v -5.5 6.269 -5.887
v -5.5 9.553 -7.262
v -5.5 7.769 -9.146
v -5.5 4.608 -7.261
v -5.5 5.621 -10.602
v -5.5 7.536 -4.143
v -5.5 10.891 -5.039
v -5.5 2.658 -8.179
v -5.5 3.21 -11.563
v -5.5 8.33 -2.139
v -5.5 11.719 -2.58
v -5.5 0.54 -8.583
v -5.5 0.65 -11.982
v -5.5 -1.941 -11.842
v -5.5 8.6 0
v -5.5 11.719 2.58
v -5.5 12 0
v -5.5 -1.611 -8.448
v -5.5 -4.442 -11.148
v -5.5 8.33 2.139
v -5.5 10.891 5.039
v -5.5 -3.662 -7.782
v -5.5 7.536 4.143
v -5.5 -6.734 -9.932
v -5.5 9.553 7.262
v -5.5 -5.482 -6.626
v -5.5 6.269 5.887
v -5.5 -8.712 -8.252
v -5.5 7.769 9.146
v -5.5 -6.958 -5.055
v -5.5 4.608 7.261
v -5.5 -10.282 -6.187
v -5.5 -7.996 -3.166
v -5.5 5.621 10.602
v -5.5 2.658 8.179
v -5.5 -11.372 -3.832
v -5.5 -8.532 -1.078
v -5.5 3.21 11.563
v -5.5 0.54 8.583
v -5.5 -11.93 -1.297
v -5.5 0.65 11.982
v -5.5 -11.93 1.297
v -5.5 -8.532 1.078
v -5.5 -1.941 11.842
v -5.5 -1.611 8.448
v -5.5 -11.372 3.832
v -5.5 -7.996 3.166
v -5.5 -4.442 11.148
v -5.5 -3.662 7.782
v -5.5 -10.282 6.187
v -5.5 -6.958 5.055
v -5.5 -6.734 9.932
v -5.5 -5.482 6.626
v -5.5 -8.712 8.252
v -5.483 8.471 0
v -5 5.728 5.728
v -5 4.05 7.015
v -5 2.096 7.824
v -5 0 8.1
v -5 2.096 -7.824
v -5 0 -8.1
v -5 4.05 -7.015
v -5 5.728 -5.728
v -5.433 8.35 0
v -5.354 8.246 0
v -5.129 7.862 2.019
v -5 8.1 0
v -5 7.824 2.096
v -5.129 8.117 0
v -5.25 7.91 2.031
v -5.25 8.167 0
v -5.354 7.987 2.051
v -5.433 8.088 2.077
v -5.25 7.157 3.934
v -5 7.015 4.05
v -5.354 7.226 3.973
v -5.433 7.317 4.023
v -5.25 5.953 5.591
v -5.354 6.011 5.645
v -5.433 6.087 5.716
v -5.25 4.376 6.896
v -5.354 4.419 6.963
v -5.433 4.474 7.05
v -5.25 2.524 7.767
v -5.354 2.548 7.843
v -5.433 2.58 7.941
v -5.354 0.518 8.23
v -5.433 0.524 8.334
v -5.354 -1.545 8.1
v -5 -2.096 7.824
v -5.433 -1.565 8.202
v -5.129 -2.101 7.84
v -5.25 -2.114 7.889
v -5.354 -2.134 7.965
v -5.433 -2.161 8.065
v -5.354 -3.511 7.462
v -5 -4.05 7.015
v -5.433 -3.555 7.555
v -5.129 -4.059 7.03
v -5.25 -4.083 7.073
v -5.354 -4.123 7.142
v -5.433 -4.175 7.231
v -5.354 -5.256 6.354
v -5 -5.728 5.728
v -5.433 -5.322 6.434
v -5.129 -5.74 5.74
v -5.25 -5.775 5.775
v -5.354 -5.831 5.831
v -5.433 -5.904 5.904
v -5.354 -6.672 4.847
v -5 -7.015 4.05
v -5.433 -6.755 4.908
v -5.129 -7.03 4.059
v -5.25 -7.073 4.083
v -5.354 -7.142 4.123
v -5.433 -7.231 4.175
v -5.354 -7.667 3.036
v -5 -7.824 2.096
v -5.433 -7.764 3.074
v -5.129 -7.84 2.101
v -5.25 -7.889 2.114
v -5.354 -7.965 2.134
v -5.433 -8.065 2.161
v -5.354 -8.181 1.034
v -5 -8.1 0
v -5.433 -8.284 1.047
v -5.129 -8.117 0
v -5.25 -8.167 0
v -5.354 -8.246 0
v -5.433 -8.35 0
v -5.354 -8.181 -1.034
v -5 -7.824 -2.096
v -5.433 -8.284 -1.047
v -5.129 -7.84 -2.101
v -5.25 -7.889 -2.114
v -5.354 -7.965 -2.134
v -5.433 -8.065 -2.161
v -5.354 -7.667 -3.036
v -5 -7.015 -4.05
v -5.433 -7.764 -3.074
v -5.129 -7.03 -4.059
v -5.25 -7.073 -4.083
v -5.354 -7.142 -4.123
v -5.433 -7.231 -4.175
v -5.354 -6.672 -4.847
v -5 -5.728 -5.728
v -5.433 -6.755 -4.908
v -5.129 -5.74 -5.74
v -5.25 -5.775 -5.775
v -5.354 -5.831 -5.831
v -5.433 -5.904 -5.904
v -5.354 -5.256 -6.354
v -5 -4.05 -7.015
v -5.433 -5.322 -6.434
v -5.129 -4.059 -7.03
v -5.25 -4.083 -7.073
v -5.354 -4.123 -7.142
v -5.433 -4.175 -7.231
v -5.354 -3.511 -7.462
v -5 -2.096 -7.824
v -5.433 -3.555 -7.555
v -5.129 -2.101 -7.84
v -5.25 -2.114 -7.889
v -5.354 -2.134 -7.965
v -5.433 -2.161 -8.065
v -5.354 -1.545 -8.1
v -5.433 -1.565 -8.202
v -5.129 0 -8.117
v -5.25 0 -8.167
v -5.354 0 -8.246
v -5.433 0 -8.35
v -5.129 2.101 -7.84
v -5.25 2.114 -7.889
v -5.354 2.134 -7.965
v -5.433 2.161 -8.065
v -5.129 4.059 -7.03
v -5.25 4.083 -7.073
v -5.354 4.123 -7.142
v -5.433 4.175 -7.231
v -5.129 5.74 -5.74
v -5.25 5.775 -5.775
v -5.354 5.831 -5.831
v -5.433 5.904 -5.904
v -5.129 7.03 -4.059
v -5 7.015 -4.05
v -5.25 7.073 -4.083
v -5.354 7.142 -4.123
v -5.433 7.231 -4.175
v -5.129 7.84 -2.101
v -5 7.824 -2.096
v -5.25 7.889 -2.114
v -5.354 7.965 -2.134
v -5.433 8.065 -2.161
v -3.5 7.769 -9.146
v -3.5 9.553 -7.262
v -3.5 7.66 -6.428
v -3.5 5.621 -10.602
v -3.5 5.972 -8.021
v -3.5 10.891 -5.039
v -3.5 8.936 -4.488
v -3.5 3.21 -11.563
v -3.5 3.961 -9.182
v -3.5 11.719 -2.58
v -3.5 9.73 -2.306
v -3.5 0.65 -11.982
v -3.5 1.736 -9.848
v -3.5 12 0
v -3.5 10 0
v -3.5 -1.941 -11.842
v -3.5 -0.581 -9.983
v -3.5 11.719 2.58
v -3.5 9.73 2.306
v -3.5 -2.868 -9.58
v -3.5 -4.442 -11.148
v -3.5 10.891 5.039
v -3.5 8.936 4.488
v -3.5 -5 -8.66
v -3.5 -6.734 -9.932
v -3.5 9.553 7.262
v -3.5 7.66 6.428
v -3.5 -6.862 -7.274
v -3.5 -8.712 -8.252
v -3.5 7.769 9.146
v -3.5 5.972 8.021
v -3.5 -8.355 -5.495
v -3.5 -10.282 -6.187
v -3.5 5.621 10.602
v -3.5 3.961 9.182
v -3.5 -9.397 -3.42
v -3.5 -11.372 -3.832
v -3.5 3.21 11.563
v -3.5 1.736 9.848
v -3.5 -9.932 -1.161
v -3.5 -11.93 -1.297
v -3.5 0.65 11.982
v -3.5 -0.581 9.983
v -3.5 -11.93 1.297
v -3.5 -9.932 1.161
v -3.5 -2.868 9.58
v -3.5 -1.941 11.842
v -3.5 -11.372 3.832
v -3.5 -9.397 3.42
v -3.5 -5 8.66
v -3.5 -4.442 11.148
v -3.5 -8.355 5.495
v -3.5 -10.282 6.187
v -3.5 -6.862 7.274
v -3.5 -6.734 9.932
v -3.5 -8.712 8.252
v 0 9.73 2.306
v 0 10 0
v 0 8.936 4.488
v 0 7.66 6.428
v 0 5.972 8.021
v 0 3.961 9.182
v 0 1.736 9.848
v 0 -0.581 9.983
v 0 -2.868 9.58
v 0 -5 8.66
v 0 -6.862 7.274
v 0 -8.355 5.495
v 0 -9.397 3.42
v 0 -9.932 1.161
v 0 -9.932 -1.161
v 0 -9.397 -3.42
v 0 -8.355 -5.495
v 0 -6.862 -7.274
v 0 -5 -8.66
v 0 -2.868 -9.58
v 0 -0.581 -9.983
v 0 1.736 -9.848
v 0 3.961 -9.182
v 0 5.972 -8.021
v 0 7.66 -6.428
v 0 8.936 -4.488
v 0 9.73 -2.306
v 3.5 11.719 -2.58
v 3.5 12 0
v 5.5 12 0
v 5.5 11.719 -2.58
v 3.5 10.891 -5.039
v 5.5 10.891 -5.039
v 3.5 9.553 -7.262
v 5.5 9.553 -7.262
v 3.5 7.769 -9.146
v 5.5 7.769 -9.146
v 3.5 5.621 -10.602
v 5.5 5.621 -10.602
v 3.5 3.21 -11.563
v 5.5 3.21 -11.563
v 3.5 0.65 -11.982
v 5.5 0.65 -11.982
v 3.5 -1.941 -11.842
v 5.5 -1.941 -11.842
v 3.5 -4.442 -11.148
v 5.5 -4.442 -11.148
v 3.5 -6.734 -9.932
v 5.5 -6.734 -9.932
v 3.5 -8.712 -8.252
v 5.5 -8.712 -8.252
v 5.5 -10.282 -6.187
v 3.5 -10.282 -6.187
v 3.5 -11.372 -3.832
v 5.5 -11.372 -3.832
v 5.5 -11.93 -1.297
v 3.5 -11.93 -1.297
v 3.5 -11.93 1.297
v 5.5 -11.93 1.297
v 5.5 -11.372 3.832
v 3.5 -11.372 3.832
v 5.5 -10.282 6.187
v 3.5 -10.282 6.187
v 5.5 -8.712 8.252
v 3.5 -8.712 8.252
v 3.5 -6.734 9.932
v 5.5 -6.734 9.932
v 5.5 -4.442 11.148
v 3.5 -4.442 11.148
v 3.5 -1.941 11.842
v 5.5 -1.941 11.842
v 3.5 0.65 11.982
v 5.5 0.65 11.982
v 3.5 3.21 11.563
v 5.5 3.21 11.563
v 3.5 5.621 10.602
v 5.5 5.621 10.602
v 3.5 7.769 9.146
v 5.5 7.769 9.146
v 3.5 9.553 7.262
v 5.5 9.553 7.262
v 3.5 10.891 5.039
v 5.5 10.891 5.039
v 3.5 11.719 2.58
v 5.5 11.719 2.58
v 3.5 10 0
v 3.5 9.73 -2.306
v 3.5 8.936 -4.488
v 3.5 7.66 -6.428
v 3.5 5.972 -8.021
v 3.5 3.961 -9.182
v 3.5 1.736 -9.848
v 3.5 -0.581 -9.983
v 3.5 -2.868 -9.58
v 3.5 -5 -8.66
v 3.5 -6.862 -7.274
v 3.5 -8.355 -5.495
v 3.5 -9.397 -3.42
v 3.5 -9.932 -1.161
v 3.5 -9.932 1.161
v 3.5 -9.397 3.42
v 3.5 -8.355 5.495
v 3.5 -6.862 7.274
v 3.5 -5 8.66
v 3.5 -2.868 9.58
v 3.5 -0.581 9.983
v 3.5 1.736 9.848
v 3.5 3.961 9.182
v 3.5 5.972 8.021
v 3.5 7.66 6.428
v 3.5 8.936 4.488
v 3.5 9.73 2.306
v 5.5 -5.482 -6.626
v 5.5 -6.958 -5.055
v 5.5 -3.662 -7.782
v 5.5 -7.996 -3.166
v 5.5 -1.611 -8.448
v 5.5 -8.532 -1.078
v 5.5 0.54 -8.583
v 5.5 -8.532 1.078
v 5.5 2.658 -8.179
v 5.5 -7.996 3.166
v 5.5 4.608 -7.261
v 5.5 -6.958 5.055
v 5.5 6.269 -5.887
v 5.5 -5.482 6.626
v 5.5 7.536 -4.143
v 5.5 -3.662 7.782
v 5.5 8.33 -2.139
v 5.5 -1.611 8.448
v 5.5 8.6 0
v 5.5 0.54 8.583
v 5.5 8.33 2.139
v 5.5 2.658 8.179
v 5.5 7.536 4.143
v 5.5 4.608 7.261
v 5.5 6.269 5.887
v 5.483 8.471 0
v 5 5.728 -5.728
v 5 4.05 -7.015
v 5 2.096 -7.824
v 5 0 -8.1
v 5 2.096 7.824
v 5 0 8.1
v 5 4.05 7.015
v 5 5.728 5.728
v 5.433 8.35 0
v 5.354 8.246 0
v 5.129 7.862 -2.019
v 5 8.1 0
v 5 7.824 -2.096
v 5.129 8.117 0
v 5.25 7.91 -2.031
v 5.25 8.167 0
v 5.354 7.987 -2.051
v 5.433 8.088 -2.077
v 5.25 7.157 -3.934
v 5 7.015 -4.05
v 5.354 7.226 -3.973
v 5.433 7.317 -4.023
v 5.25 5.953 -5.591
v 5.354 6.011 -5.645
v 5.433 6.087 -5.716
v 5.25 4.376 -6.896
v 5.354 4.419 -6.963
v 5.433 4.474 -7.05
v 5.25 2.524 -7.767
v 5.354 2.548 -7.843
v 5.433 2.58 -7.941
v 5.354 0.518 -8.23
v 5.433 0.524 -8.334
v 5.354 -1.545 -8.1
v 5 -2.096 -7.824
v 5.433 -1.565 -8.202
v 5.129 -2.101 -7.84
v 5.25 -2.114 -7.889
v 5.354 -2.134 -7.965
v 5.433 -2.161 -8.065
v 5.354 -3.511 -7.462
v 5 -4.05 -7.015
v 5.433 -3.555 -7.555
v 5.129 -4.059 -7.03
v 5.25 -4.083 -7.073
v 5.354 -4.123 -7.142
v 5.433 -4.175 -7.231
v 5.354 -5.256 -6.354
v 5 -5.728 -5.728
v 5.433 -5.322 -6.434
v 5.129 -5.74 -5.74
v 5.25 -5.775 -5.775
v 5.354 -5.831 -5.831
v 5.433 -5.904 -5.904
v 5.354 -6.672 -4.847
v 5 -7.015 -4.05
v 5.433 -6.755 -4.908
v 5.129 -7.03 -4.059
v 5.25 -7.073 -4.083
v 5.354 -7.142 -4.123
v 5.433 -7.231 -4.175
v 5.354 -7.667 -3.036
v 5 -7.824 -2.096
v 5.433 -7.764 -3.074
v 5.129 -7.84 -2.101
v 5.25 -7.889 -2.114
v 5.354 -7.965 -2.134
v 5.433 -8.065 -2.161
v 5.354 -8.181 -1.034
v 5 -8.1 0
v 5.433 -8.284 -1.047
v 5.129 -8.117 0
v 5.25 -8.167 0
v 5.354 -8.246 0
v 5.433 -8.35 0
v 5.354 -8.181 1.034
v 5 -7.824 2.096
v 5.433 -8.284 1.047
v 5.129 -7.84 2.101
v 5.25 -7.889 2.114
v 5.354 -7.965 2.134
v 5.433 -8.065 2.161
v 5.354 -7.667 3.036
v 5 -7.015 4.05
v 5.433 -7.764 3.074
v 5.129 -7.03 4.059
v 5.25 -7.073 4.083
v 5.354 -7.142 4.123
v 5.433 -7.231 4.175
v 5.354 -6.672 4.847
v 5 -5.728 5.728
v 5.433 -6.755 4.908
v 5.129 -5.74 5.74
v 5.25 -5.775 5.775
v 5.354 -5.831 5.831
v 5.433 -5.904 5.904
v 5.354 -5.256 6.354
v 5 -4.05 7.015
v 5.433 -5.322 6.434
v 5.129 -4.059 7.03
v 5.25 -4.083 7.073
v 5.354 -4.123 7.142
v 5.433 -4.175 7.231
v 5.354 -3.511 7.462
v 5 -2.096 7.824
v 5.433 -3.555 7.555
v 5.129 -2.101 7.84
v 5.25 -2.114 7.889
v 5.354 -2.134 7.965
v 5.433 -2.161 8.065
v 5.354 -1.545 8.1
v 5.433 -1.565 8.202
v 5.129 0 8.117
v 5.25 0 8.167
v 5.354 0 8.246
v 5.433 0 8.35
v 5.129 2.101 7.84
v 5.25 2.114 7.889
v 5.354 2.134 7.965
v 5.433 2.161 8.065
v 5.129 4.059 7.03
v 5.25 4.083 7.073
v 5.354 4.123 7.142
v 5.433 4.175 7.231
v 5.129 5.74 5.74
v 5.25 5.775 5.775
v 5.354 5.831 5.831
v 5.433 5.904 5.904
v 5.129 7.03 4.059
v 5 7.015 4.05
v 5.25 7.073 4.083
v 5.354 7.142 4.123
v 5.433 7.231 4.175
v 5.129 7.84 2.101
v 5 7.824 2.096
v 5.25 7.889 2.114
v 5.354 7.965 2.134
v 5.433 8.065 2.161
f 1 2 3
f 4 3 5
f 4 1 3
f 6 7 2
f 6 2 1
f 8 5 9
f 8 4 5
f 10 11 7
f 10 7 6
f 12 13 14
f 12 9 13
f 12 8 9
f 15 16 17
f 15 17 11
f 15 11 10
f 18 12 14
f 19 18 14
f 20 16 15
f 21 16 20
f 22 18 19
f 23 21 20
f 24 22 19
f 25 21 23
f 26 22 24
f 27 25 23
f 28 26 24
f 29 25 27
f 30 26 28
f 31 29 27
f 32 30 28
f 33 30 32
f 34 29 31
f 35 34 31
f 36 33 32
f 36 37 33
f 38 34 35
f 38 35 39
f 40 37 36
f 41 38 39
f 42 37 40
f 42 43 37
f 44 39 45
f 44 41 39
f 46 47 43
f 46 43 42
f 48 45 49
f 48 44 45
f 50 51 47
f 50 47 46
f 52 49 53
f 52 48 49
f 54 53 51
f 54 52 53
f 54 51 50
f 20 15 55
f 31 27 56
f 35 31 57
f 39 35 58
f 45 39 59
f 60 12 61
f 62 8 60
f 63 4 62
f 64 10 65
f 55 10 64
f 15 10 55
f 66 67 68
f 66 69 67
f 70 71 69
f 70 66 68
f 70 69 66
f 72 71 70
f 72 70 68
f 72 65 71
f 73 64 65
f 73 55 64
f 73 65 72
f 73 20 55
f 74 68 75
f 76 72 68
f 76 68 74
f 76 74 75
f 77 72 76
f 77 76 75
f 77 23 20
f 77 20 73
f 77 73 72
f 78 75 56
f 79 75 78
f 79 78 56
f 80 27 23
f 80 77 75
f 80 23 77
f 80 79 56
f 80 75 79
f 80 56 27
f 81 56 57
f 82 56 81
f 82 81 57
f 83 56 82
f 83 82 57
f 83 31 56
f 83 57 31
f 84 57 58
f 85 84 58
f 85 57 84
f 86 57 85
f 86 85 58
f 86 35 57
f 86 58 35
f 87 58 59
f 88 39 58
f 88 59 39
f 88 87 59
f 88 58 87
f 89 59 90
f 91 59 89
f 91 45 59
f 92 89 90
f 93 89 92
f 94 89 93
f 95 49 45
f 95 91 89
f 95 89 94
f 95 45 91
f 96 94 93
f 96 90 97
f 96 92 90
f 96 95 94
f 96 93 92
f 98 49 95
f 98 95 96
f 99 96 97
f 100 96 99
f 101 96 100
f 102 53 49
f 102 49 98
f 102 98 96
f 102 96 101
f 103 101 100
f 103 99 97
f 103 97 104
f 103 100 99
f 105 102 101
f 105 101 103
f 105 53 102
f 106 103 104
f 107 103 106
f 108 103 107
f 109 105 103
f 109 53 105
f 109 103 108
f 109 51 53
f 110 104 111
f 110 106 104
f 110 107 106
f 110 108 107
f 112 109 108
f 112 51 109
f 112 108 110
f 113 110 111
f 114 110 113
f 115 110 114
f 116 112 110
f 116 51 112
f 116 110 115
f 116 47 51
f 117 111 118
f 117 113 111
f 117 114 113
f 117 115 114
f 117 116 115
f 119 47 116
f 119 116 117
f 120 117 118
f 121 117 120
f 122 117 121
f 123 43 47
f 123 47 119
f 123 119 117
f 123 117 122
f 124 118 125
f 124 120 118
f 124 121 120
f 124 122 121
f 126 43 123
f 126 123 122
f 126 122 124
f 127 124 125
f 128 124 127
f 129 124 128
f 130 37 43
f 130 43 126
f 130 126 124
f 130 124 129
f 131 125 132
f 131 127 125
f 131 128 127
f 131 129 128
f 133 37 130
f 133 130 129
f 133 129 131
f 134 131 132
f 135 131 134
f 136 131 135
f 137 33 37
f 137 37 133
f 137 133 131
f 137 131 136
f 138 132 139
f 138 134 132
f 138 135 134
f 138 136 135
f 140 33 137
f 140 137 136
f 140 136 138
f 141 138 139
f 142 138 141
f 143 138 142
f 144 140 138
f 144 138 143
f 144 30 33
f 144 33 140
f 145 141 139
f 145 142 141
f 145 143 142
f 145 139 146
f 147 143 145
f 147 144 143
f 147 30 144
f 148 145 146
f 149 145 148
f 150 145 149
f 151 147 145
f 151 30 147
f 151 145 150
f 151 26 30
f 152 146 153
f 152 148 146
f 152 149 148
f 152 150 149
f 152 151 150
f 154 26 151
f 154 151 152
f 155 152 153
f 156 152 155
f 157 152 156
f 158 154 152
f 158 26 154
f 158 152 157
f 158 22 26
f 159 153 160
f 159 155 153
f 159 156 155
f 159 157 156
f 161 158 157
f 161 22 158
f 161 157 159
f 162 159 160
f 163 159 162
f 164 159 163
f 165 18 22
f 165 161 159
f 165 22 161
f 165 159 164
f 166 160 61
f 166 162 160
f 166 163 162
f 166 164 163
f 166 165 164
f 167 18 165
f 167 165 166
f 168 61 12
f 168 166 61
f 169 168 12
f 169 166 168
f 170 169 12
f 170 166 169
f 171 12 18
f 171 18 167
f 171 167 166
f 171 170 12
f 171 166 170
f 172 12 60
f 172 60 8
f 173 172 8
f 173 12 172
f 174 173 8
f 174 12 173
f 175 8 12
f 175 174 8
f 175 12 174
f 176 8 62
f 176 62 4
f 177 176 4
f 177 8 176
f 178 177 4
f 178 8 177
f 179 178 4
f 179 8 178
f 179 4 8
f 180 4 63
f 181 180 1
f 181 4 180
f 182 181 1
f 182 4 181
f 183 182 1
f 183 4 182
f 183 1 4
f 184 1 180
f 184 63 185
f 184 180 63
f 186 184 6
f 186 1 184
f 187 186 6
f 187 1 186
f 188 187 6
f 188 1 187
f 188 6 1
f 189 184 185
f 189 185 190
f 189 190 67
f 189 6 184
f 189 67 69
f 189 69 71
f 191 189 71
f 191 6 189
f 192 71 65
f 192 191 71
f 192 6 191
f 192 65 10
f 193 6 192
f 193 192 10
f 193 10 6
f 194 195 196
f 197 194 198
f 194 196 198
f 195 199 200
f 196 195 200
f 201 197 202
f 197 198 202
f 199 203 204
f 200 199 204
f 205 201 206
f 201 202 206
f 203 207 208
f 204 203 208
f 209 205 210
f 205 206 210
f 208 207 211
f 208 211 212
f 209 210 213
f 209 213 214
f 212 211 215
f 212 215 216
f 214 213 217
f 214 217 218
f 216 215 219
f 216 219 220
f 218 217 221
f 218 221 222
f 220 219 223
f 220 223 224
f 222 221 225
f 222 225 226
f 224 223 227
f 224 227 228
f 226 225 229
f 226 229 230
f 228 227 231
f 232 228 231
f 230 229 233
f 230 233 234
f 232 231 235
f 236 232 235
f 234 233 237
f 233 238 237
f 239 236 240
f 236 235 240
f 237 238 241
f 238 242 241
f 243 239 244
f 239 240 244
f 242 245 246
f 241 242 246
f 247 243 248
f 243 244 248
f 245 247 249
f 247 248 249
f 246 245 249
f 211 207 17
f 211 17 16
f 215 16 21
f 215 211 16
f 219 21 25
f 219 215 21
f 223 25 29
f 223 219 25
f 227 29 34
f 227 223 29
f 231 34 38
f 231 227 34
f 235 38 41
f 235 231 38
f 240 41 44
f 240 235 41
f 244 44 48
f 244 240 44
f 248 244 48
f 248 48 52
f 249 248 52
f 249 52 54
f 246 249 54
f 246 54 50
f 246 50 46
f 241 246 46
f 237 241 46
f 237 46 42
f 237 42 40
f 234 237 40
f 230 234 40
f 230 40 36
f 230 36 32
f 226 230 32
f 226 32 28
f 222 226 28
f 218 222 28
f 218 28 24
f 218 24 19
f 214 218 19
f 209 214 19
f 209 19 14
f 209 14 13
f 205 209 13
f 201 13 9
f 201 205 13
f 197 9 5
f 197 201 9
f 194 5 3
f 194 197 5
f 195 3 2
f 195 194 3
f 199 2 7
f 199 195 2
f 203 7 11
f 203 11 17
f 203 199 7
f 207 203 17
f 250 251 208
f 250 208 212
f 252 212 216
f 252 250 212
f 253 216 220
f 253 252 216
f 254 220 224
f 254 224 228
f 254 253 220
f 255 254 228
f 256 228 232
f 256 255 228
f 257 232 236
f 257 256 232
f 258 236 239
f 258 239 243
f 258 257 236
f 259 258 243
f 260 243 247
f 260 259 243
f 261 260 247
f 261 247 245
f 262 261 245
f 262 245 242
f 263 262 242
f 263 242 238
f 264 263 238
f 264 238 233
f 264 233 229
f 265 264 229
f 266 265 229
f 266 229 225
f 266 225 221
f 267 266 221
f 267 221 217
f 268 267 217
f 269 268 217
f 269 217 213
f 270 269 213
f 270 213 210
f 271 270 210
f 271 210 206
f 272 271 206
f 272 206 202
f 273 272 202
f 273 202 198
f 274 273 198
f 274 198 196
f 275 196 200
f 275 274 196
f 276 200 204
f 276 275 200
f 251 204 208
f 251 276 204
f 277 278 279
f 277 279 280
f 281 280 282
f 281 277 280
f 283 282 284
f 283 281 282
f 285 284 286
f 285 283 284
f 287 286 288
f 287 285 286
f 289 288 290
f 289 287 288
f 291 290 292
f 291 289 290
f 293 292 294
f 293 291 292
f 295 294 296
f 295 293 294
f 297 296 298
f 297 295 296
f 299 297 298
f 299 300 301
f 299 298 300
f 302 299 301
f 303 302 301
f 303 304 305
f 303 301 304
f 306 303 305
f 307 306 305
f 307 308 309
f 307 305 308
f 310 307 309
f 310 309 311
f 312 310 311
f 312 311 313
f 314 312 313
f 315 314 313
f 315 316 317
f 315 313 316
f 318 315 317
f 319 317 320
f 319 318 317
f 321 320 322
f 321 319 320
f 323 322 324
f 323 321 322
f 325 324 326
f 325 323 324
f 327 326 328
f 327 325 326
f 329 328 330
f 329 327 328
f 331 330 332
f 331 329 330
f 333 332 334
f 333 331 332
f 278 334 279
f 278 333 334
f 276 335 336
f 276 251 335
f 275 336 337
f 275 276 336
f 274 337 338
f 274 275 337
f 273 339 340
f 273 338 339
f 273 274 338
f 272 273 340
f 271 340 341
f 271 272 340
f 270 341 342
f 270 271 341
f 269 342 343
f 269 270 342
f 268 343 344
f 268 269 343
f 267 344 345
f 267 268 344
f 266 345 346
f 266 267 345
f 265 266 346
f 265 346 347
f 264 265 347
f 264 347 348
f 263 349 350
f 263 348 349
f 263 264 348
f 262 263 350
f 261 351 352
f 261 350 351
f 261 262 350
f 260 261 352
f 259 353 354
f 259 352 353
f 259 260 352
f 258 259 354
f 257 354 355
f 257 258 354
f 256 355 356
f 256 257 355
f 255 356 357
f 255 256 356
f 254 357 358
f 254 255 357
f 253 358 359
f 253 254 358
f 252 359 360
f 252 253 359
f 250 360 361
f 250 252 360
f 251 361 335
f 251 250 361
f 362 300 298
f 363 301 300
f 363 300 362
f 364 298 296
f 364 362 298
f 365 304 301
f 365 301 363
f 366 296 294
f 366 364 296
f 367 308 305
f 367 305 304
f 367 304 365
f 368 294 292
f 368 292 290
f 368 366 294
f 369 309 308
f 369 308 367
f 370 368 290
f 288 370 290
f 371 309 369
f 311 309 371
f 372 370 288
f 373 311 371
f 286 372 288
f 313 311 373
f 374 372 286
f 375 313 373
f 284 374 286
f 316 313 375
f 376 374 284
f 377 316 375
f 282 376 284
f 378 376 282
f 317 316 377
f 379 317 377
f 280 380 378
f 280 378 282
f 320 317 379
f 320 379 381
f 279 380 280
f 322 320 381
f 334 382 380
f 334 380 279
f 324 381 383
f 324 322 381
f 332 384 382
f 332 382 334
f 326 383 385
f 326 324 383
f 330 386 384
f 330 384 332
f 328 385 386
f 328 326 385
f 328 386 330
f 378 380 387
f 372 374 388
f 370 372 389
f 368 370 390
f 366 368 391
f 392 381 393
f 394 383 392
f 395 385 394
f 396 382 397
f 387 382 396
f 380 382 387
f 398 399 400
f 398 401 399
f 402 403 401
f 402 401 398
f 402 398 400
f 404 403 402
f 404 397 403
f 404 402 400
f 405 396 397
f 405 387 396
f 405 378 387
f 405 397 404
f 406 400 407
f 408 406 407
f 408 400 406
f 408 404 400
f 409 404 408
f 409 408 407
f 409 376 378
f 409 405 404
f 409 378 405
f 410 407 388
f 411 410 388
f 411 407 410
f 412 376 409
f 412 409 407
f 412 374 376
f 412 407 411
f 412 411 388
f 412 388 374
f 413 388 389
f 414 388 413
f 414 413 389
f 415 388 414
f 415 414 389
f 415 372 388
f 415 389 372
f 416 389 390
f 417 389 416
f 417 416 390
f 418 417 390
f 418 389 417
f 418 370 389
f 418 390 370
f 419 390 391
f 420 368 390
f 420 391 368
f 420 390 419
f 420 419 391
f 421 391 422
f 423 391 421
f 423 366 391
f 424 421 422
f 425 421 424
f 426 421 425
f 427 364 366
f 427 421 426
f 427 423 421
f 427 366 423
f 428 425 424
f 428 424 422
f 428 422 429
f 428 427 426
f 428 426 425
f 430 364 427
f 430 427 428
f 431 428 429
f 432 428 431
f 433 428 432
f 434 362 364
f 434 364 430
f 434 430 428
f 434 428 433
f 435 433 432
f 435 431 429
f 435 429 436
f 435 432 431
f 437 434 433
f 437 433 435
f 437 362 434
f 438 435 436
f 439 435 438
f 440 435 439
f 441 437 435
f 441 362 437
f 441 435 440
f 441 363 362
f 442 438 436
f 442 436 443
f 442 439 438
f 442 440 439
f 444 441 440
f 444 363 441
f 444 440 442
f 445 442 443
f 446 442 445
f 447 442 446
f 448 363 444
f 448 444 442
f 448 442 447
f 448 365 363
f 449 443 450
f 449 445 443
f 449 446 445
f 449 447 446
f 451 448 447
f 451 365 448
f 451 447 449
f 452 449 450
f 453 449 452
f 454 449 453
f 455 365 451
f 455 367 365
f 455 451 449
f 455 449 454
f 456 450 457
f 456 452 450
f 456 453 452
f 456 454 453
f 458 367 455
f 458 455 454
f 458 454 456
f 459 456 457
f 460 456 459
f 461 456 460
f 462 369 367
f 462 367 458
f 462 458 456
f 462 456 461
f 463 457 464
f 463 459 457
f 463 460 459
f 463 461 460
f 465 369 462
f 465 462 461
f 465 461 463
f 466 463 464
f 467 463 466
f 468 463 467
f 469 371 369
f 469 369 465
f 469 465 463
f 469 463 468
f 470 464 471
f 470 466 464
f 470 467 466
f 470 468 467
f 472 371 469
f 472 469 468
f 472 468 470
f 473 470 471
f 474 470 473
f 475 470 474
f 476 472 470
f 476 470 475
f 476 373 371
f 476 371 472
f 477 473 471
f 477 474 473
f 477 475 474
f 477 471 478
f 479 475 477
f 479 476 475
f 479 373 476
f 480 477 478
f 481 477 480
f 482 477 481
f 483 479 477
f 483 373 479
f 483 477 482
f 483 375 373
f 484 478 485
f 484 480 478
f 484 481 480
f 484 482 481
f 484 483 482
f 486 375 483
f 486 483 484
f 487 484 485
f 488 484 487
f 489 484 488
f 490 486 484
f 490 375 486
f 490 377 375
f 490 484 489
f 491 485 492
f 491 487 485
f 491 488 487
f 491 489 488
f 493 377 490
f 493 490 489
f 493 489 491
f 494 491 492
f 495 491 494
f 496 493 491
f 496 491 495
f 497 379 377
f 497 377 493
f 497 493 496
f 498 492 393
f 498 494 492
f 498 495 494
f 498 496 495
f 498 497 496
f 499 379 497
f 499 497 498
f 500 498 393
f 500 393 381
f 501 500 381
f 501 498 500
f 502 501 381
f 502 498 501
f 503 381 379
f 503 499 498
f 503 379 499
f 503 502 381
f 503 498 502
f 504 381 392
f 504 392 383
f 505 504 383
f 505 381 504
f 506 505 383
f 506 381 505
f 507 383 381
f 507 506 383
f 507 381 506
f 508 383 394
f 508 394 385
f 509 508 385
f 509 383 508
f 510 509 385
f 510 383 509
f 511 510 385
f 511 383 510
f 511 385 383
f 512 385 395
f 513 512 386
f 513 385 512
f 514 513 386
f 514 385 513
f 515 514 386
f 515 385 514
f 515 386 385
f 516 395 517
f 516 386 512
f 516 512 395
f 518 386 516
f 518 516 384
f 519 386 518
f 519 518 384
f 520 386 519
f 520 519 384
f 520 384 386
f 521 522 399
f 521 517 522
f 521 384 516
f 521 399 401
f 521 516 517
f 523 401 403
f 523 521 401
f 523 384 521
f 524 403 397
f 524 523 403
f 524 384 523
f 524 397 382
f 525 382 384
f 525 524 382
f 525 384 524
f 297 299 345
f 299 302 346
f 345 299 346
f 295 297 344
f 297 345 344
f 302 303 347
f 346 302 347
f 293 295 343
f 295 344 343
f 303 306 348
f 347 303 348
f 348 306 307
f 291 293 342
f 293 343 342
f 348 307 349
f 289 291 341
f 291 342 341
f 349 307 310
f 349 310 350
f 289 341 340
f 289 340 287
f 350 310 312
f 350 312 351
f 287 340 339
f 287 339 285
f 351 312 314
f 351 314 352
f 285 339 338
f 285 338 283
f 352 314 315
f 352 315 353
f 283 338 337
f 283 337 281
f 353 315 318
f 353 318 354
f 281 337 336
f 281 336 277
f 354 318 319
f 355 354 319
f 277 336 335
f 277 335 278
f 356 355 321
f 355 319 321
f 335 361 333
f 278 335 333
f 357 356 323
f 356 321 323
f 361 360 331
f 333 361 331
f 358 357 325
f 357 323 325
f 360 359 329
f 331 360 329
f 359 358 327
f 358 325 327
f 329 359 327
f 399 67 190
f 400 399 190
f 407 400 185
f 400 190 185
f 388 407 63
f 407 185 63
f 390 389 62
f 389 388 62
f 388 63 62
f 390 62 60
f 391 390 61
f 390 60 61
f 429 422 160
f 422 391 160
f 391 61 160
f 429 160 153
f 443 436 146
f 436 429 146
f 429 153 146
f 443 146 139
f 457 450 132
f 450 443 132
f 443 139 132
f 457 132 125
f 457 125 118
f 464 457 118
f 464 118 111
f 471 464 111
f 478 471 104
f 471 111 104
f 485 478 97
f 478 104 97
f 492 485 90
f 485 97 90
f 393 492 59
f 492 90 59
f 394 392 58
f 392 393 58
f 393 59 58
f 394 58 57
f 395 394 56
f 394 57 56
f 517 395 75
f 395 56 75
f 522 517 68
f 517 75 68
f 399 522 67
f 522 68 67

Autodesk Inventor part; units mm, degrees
ref_plane "YZ Plane" through (0, 0, 0) normal (1, 0, 0) x (0, 1, 0)
ref_plane "XZ Plane" through (0, 0, 0) normal (0, 1, 0) x (-1, 0, 0)
ref_plane "XY Plane" through (0, 0, 0) normal (0, 0, 1) x (1, 0, 0)
sketch "Sketch1" plane through (0, 0, 0) normal (0, 0, 1) x (1, 0, 0)
  line L0 (5.5, 8.1) -> (5.5, 12)
  line L1 (5.5, 12) -> (3.5, 12)
  line L2 (3.5, 12) -> (3.5, 10)
  line L3 (3.5, 10) -> (0, 10)
  line L4 (5.5, 8.1) -> (0, 8.1)
  line L5 (0, 8.1) -> (0, 10)
  line L6 (-2.3, 0) -> (6.8, 0) projected
  line L7 (0, 5.6) -> (0, 23.1) projected
  line L8 (0, 14.6) -> (0, 8.1)
  line L9 (0, 20.6) -> (0, 14.6)
  point P0 (0, 9.05)
  point P1 (-1, 12)
  point P2 (4.5, 12)
  dimension "d0" = 5.5
  dimension "d1" = 3.5
  dimension "d2" = 10
  dimension "d3" = 12
  dimension "d4" = 8.1
  dimension "d8" = 1
revolve "Revolution1" add sketch "Sketch1" angle 360 about axis through (-10, 0, 0) along (1, 0, 0)
mirror "Mirror2" about plane through (0, 0, 0) normal (1, 0, 0) of "Revolution1"
fillet "Fillet1" radius 0.5 2 edges at (5.5, -8.1, 0) (-5.5, -8.1, 0)
properties part number "Idler_Pulley_Overlay_3DPrint"
